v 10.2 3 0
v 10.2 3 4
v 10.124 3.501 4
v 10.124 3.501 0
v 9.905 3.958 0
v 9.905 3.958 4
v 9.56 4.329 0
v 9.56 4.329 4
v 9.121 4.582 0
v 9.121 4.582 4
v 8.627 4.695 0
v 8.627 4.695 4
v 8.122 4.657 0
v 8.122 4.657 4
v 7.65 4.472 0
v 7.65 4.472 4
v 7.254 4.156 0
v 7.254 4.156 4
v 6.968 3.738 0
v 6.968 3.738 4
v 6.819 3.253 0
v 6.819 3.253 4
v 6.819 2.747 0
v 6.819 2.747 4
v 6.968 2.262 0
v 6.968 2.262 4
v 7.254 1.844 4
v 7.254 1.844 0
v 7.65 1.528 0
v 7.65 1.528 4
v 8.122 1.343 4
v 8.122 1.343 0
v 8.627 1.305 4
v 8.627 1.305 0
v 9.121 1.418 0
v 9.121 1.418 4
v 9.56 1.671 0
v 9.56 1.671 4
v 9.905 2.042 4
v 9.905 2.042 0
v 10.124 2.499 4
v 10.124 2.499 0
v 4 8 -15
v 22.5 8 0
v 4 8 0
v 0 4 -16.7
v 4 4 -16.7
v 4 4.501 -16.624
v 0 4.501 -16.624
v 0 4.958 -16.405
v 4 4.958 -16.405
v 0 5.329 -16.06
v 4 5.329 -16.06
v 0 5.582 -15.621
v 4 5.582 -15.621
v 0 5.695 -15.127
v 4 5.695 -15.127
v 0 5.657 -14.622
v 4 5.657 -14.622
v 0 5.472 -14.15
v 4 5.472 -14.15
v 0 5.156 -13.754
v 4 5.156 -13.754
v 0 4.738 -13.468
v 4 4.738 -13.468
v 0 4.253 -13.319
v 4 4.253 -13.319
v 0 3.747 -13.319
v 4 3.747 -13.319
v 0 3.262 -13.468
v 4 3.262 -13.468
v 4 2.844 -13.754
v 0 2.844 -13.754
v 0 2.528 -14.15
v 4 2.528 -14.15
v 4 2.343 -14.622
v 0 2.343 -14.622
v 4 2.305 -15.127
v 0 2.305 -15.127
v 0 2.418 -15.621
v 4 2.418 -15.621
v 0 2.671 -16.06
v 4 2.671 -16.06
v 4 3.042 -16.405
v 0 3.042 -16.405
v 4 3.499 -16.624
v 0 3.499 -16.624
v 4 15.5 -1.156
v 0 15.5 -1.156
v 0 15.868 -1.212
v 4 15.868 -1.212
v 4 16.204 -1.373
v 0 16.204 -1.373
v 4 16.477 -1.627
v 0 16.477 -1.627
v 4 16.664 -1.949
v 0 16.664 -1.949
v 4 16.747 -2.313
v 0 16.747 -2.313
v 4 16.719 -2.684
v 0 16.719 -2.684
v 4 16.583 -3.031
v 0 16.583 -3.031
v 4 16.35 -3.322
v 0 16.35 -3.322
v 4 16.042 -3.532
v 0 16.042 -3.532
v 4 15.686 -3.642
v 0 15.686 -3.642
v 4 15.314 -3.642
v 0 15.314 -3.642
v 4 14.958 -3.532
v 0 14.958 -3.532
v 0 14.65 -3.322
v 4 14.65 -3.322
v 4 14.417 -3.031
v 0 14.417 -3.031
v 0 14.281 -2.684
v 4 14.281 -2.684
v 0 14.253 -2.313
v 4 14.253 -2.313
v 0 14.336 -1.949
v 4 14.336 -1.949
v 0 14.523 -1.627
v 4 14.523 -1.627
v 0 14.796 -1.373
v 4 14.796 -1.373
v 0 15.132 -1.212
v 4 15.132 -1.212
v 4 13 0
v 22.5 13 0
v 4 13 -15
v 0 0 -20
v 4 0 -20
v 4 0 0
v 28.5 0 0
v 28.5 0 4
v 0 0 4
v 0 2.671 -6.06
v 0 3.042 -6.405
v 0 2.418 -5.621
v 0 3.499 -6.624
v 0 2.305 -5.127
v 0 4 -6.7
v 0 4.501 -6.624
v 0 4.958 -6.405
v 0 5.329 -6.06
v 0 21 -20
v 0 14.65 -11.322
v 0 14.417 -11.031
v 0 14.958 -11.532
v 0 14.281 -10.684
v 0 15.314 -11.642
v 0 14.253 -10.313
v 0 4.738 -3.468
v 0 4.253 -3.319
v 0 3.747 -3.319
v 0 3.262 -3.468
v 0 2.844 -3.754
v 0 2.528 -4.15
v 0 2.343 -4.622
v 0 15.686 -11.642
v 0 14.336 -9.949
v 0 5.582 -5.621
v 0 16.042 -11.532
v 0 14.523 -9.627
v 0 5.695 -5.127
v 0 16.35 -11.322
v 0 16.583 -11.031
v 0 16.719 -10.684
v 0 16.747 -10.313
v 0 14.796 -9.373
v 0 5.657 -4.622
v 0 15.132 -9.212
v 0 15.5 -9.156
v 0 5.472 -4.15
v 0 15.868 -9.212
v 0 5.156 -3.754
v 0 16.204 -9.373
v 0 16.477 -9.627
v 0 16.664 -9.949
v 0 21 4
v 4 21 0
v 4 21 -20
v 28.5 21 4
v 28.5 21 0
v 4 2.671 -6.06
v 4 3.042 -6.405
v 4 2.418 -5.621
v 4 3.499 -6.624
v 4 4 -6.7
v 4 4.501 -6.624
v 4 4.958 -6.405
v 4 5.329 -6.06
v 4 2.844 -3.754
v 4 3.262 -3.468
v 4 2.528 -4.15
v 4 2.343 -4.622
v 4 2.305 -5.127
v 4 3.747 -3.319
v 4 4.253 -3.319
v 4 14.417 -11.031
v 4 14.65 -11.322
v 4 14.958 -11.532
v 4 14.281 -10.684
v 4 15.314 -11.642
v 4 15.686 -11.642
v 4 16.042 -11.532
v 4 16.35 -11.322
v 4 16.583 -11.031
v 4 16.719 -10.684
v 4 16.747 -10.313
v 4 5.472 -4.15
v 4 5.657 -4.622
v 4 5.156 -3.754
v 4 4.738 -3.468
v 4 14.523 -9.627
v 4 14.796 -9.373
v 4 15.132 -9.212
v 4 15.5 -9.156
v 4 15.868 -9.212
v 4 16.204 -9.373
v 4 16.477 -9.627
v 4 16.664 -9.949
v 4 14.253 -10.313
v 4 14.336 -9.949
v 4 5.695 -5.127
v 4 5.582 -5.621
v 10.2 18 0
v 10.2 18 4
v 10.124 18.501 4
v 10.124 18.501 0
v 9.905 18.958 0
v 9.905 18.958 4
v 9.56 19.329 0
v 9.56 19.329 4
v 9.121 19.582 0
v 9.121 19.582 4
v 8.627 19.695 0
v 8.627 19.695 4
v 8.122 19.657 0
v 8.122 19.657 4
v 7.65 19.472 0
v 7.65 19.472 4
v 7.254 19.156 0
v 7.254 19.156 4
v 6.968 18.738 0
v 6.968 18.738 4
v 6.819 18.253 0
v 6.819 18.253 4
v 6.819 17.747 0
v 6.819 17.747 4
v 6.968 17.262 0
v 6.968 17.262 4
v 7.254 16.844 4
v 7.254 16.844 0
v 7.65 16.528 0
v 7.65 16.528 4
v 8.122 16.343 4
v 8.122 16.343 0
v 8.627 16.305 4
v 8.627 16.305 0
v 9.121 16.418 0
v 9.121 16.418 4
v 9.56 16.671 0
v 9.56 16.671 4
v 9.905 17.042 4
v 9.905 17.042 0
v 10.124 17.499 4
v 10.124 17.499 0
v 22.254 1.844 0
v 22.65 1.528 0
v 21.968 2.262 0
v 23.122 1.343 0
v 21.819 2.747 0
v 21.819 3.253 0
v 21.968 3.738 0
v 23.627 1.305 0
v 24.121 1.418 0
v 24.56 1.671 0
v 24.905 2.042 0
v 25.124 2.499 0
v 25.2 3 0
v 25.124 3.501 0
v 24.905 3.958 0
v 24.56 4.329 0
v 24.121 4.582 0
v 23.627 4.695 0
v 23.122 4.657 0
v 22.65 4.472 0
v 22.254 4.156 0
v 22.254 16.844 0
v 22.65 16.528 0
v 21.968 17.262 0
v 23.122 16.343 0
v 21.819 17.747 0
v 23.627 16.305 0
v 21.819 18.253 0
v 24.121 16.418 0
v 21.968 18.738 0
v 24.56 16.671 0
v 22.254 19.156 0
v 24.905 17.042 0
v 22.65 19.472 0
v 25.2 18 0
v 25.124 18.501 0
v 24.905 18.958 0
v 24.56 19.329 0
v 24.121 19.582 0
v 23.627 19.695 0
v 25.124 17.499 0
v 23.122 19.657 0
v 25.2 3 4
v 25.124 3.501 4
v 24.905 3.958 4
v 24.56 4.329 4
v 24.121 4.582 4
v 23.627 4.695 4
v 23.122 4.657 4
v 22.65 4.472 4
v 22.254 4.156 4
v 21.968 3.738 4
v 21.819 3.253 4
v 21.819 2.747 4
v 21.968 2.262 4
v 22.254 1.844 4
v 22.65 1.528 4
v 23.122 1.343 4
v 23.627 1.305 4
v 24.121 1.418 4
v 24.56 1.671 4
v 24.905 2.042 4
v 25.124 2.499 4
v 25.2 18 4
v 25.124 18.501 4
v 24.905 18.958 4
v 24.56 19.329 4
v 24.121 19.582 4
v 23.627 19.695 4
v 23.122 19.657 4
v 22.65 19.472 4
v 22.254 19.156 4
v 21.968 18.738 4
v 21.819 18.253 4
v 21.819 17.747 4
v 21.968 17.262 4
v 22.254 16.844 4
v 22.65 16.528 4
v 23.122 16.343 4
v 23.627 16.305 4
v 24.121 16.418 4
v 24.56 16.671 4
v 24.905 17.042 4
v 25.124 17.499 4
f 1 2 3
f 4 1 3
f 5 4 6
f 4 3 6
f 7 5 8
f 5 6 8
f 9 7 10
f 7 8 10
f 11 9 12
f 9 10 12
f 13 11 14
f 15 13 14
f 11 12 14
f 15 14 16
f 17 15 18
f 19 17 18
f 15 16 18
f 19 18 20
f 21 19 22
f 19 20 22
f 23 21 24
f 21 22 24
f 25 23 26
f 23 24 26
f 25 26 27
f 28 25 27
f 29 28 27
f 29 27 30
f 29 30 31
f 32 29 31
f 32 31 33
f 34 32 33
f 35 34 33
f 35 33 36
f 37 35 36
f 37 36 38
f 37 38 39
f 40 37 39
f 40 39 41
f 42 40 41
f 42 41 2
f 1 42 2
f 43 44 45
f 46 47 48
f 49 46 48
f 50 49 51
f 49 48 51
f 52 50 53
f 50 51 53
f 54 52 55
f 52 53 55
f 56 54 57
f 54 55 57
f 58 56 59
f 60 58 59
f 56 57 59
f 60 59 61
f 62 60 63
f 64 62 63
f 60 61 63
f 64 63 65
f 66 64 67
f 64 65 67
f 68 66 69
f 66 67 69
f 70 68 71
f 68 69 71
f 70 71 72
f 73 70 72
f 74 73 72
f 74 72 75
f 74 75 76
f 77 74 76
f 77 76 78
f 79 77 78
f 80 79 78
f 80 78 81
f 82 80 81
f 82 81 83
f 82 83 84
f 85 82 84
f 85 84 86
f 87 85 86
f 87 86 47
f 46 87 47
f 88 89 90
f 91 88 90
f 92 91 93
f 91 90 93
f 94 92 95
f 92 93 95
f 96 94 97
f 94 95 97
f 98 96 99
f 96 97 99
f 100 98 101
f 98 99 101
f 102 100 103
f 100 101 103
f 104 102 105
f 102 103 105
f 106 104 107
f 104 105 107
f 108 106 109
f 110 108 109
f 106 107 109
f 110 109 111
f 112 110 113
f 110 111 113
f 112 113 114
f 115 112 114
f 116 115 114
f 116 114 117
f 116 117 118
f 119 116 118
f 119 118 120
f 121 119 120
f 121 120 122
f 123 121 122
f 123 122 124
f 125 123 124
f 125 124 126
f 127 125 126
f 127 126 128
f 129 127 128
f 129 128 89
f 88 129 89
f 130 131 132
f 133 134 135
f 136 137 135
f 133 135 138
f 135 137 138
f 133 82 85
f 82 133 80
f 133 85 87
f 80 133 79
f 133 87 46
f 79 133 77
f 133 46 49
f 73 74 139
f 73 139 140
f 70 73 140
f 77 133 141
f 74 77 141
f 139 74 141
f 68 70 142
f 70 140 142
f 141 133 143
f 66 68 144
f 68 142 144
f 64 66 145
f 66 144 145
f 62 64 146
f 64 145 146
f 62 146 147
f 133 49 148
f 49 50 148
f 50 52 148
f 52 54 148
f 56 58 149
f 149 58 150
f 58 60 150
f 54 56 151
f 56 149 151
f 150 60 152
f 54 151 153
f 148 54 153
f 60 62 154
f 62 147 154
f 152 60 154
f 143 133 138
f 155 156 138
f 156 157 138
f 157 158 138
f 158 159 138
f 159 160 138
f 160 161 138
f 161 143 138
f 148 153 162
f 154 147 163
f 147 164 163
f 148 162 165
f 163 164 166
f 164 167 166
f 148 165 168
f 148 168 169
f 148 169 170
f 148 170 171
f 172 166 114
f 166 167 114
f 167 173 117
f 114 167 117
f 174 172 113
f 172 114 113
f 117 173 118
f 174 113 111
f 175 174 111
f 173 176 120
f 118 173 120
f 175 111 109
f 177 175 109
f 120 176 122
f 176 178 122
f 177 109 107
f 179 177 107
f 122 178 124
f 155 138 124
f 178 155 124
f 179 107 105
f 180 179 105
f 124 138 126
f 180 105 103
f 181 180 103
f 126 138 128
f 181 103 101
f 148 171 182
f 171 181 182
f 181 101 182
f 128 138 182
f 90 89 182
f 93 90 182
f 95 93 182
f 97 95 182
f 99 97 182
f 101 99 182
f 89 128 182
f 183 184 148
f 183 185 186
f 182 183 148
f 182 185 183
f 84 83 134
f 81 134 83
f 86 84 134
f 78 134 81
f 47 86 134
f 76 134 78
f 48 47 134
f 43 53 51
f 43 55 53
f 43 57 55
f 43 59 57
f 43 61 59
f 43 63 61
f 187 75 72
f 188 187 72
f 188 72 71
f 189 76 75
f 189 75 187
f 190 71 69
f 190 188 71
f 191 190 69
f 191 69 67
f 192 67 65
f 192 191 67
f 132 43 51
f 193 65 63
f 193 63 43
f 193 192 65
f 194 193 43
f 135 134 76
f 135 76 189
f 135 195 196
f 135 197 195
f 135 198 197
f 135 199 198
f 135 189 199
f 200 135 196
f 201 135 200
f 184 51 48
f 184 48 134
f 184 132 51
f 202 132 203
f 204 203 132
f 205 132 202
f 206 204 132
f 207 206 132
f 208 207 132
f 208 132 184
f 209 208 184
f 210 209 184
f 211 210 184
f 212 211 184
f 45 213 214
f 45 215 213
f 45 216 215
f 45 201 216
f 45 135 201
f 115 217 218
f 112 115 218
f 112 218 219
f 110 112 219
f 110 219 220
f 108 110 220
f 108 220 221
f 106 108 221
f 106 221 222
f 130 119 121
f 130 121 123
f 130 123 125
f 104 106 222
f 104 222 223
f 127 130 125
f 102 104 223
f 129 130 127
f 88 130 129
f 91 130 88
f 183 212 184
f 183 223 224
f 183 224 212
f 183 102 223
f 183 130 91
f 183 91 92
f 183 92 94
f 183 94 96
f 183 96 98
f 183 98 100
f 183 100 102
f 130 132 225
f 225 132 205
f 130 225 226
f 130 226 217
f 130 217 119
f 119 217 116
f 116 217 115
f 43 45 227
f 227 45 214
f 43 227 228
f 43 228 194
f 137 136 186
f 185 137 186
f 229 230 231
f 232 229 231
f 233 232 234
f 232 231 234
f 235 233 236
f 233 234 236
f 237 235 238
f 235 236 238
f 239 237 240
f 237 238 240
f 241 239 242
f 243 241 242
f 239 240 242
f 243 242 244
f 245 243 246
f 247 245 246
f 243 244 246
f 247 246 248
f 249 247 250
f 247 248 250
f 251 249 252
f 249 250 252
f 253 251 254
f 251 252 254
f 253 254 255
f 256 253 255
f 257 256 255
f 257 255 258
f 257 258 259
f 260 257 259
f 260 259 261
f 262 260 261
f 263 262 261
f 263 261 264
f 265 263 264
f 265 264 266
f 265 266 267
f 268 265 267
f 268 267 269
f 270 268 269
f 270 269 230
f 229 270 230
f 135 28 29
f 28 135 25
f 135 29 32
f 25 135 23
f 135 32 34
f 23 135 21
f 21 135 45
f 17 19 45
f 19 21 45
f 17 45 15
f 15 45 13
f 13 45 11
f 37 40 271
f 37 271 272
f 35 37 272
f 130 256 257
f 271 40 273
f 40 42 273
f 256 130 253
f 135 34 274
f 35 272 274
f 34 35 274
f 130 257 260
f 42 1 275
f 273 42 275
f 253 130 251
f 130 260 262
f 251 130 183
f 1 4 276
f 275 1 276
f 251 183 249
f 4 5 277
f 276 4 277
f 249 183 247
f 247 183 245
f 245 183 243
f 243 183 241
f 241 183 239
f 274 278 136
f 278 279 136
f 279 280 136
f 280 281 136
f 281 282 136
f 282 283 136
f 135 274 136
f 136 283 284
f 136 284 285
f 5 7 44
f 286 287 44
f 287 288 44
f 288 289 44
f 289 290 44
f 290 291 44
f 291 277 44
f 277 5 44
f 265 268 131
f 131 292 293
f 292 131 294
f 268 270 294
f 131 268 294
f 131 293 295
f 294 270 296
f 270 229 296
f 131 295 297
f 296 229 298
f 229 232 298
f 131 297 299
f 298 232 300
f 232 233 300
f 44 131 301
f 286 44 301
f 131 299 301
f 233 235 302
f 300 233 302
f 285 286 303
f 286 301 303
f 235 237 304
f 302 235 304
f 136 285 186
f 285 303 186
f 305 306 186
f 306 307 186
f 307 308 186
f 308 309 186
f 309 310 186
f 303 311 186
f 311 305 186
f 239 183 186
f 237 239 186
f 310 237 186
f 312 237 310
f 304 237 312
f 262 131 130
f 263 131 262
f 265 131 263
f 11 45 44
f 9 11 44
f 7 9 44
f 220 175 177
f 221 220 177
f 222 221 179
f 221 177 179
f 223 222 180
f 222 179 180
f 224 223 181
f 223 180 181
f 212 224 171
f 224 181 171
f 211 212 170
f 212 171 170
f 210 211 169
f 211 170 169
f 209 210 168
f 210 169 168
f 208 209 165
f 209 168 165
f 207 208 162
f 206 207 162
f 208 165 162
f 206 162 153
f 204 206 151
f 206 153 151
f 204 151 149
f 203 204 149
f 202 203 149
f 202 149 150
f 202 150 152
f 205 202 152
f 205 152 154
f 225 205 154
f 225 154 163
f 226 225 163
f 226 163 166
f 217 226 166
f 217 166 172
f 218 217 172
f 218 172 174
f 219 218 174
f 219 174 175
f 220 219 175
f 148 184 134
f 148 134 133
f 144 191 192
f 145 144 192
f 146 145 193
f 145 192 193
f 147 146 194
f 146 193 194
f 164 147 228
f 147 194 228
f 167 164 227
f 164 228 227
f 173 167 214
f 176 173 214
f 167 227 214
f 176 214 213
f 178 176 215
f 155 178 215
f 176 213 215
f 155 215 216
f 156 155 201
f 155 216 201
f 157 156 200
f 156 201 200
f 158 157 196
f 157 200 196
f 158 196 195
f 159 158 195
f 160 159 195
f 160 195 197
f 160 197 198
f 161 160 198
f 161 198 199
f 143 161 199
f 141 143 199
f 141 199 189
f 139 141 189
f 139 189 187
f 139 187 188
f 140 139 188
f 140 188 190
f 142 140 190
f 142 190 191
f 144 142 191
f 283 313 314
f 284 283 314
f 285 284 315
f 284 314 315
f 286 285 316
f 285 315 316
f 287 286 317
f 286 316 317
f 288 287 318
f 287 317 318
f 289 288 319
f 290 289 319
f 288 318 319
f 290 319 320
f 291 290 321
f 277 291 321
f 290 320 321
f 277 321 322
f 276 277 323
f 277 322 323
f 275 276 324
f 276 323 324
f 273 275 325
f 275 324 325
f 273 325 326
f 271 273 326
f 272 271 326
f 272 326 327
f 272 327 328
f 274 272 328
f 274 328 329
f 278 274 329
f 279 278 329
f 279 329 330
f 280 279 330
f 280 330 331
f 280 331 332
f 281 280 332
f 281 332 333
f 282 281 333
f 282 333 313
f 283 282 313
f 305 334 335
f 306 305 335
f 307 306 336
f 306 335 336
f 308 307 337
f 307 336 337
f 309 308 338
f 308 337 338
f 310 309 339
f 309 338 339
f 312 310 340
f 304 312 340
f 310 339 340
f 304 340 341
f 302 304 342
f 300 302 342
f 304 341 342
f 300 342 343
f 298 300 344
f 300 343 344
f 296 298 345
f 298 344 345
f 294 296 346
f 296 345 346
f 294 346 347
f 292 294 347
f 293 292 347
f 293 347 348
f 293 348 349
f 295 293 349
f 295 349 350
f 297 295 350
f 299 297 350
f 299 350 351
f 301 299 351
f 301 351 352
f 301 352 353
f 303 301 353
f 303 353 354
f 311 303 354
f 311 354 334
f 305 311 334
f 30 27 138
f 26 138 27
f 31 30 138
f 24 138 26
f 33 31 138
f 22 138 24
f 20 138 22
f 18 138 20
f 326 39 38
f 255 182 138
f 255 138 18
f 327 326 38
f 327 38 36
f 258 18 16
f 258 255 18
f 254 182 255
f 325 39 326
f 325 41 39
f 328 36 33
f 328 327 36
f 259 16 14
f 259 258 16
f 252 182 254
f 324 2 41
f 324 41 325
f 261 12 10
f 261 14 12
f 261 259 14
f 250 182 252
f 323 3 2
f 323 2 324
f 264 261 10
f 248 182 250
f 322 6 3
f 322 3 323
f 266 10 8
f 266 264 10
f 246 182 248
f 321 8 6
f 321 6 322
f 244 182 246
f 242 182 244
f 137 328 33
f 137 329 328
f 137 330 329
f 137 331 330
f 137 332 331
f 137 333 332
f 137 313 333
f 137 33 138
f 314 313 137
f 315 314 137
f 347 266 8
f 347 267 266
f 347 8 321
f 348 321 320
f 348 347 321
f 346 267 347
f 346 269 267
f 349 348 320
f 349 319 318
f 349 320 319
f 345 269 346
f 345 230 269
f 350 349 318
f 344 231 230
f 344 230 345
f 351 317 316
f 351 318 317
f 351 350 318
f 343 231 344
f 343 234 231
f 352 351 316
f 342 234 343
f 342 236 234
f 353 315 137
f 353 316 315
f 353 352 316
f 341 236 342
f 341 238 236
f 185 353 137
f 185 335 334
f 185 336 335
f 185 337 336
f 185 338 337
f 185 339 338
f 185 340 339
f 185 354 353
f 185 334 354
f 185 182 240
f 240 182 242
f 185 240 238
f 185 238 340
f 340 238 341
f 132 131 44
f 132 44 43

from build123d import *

# Parameters (mm, degrees)
SKETCH_1_W          = 28.5
SKETCH_1_H          = 21
EXTRUDE_1_DEPTH     = 4
SKETCH_2_W          = 4
SKETCH_2_H          = 21
EXTRUDE_2_DEPTH     = 20
RIB_1_REACH         = 38.366
SKETCH_3_WALL_W     = 98.549396912
SKETCH_3_WALL_H     = 5
CUT_EXTRUDE_1_REACH = 42.66
SKETCH_4_R          = 1.25
CUT_EXTRUDE_2_REACH = 44.77
SKETCH_5_R          = 1.7
CUT_EXTRUDE_3_REACH = 39.964
SKETCH_6_R          = 1.7


with BuildPart() as part:
    # 草图1 → 凸台-拉伸1 (new body)
    with BuildSketch(Plane.XY):
        with Locations((14.25, 10.5)):
            Rectangle(SKETCH_1_W, SKETCH_1_H)
    extrude(amount=EXTRUDE_1_DEPTH)

    # 草图2 → 凸台-拉伸2 (add)
    with BuildSketch(Plane(origin=(0, 0, 0), x_dir=(-1, 0, 0), z_dir=(0, 0, -1))):
        with Locations((-2, 10.5)):
            Rectangle(SKETCH_2_W, SKETCH_2_H)
    extrude(amount=EXTRUDE_2_DEPTH)

    # 草图3 wall → 筋1 (add, up to next)
    with BuildSketch(Plane(origin=(13.25, 10.5, -7.5), x_dir=(-0.77675574872, 0, -0.629801958421), z_dir=(0.629801958421, 0, -0.77675574872)), mode=Mode.PRIVATE) as rib_1_sk1:
        Rectangle(SKETCH_3_WALL_W, SKETCH_3_WALL_H)
    rib_1_tool1 = extrude(rib_1_sk1.sketch, amount=-RIB_1_REACH, mode=Mode.PRIVATE) - part.part
    add(rib_1_tool1.solids().sort_by_distance((13.25, 10.5, -7.5))[0])

    # 草图4 → 切除-拉伸1 (cut, up to next)
    with BuildSketch(Plane.ZY, mode=Mode.PRIVATE) as cut_extrude_1_sk1:
        with Locations((-2.406007896, 15.5)):
            Circle(SKETCH_4_R)
    cut_extrude_1_tool1 = extrude(cut_extrude_1_sk1.sketch, amount=-CUT_EXTRUDE_1_REACH, mode=Mode.PRIVATE) & part.part
    # 草图4 → 切除-拉伸1 (cut, up to next)
    with BuildSketch(Plane.ZY, mode=Mode.PRIVATE) as cut_extrude_1_sk2:
        with Locations((-10.406007896, 15.5)):
            Circle(SKETCH_4_R)
    cut_extrude_1_tool2 = extrude(cut_extrude_1_sk2.sketch, amount=-CUT_EXTRUDE_1_REACH, mode=Mode.PRIVATE) & part.part
    add(cut_extrude_1_tool1.solids().sort_by_distance((0, 15.5, -2.406008))[0], mode=Mode.SUBTRACT)
    add(cut_extrude_1_tool2.solids().sort_by_distance((0, 15.5, -10.406008))[0], mode=Mode.SUBTRACT)

    # 草图5 → 切除-拉伸2 (cut, up to next)
    with BuildSketch(Plane.XY.offset(4), mode=Mode.PRIVATE) as cut_extrude_2_sk1:
        with Locations((23.5, 18)):
            Circle(SKETCH_5_R)
    cut_extrude_2_tool1 = extrude(cut_extrude_2_sk1.sketch, amount=-CUT_EXTRUDE_2_REACH, mode=Mode.PRIVATE) & part.part
    # 草图5 → 切除-拉伸2 (cut, up to next)
    with BuildSketch(Plane.XY.offset(4), mode=Mode.PRIVATE) as cut_extrude_2_sk2:
        with Locations((8.5, 3)):
            Circle(SKETCH_5_R)
    cut_extrude_2_tool2 = extrude(cut_extrude_2_sk2.sketch, amount=-CUT_EXTRUDE_2_REACH, mode=Mode.PRIVATE) & part.part
    # 草图5 → 切除-拉伸2 (cut, up to next)
    with BuildSketch(Plane.XY.offset(4), mode=Mode.PRIVATE) as cut_extrude_2_sk3:
        with Locations((23.5, 3)):
            Circle(SKETCH_5_R)
    cut_extrude_2_tool3 = extrude(cut_extrude_2_sk3.sketch, amount=-CUT_EXTRUDE_2_REACH, mode=Mode.PRIVATE) & part.part
    # 草图5 → 切除-拉伸2 (cut, up to next)
    with BuildSketch(Plane.XY.offset(4), mode=Mode.PRIVATE) as cut_extrude_2_sk4:
        with Locations((8.5, 18)):
            Circle(SKETCH_5_R)
    cut_extrude_2_tool4 = extrude(cut_extrude_2_sk4.sketch, amount=-CUT_EXTRUDE_2_REACH, mode=Mode.PRIVATE) & part.part
    add(cut_extrude_2_tool1.solids().sort_by_distance((23.5, 18, 4))[0], mode=Mode.SUBTRACT)
    add(cut_extrude_2_tool2.solids().sort_by_distance((8.5, 3, 4))[0], mode=Mode.SUBTRACT)
    add(cut_extrude_2_tool3.solids().sort_by_distance((23.5, 3, 4))[0], mode=Mode.SUBTRACT)
    add(cut_extrude_2_tool4.solids().sort_by_distance((8.5, 18, 4))[0], mode=Mode.SUBTRACT)

    # 草图6 → 切除-拉伸3 (cut, up to next)
    with BuildSketch(Plane(origin=(4, 0, 0), x_dir=(0, 0, -1), z_dir=(1, 0, 0)), mode=Mode.PRIVATE) as cut_extrude_3_sk1:
        with Locations((5, 4)):
            Circle(SKETCH_6_R)
    cut_extrude_3_tool1 = extrude(cut_extrude_3_sk1.sketch, amount=-CUT_EXTRUDE_3_REACH, mode=Mode.PRIVATE) & part.part
    # 草图6 → 切除-拉伸3 (cut, up to next)
    with BuildSketch(Plane(origin=(4, 0, 0), x_dir=(0, 0, -1), z_dir=(1, 0, 0)), mode=Mode.PRIVATE) as cut_extrude_3_sk2:
        with Locations((15, 4)):
            Circle(SKETCH_6_R)
    cut_extrude_3_tool2 = extrude(cut_extrude_3_sk2.sketch, amount=-CUT_EXTRUDE_3_REACH, mode=Mode.PRIVATE) & part.part
    add(cut_extrude_3_tool1.solids().sort_by_distance((4, 4, -5))[0], mode=Mode.SUBTRACT)
    add(cut_extrude_3_tool2.solids().sort_by_distance((4, 4, -15))[0], mode=Mode.SUBTRACT)


solid = part.part
